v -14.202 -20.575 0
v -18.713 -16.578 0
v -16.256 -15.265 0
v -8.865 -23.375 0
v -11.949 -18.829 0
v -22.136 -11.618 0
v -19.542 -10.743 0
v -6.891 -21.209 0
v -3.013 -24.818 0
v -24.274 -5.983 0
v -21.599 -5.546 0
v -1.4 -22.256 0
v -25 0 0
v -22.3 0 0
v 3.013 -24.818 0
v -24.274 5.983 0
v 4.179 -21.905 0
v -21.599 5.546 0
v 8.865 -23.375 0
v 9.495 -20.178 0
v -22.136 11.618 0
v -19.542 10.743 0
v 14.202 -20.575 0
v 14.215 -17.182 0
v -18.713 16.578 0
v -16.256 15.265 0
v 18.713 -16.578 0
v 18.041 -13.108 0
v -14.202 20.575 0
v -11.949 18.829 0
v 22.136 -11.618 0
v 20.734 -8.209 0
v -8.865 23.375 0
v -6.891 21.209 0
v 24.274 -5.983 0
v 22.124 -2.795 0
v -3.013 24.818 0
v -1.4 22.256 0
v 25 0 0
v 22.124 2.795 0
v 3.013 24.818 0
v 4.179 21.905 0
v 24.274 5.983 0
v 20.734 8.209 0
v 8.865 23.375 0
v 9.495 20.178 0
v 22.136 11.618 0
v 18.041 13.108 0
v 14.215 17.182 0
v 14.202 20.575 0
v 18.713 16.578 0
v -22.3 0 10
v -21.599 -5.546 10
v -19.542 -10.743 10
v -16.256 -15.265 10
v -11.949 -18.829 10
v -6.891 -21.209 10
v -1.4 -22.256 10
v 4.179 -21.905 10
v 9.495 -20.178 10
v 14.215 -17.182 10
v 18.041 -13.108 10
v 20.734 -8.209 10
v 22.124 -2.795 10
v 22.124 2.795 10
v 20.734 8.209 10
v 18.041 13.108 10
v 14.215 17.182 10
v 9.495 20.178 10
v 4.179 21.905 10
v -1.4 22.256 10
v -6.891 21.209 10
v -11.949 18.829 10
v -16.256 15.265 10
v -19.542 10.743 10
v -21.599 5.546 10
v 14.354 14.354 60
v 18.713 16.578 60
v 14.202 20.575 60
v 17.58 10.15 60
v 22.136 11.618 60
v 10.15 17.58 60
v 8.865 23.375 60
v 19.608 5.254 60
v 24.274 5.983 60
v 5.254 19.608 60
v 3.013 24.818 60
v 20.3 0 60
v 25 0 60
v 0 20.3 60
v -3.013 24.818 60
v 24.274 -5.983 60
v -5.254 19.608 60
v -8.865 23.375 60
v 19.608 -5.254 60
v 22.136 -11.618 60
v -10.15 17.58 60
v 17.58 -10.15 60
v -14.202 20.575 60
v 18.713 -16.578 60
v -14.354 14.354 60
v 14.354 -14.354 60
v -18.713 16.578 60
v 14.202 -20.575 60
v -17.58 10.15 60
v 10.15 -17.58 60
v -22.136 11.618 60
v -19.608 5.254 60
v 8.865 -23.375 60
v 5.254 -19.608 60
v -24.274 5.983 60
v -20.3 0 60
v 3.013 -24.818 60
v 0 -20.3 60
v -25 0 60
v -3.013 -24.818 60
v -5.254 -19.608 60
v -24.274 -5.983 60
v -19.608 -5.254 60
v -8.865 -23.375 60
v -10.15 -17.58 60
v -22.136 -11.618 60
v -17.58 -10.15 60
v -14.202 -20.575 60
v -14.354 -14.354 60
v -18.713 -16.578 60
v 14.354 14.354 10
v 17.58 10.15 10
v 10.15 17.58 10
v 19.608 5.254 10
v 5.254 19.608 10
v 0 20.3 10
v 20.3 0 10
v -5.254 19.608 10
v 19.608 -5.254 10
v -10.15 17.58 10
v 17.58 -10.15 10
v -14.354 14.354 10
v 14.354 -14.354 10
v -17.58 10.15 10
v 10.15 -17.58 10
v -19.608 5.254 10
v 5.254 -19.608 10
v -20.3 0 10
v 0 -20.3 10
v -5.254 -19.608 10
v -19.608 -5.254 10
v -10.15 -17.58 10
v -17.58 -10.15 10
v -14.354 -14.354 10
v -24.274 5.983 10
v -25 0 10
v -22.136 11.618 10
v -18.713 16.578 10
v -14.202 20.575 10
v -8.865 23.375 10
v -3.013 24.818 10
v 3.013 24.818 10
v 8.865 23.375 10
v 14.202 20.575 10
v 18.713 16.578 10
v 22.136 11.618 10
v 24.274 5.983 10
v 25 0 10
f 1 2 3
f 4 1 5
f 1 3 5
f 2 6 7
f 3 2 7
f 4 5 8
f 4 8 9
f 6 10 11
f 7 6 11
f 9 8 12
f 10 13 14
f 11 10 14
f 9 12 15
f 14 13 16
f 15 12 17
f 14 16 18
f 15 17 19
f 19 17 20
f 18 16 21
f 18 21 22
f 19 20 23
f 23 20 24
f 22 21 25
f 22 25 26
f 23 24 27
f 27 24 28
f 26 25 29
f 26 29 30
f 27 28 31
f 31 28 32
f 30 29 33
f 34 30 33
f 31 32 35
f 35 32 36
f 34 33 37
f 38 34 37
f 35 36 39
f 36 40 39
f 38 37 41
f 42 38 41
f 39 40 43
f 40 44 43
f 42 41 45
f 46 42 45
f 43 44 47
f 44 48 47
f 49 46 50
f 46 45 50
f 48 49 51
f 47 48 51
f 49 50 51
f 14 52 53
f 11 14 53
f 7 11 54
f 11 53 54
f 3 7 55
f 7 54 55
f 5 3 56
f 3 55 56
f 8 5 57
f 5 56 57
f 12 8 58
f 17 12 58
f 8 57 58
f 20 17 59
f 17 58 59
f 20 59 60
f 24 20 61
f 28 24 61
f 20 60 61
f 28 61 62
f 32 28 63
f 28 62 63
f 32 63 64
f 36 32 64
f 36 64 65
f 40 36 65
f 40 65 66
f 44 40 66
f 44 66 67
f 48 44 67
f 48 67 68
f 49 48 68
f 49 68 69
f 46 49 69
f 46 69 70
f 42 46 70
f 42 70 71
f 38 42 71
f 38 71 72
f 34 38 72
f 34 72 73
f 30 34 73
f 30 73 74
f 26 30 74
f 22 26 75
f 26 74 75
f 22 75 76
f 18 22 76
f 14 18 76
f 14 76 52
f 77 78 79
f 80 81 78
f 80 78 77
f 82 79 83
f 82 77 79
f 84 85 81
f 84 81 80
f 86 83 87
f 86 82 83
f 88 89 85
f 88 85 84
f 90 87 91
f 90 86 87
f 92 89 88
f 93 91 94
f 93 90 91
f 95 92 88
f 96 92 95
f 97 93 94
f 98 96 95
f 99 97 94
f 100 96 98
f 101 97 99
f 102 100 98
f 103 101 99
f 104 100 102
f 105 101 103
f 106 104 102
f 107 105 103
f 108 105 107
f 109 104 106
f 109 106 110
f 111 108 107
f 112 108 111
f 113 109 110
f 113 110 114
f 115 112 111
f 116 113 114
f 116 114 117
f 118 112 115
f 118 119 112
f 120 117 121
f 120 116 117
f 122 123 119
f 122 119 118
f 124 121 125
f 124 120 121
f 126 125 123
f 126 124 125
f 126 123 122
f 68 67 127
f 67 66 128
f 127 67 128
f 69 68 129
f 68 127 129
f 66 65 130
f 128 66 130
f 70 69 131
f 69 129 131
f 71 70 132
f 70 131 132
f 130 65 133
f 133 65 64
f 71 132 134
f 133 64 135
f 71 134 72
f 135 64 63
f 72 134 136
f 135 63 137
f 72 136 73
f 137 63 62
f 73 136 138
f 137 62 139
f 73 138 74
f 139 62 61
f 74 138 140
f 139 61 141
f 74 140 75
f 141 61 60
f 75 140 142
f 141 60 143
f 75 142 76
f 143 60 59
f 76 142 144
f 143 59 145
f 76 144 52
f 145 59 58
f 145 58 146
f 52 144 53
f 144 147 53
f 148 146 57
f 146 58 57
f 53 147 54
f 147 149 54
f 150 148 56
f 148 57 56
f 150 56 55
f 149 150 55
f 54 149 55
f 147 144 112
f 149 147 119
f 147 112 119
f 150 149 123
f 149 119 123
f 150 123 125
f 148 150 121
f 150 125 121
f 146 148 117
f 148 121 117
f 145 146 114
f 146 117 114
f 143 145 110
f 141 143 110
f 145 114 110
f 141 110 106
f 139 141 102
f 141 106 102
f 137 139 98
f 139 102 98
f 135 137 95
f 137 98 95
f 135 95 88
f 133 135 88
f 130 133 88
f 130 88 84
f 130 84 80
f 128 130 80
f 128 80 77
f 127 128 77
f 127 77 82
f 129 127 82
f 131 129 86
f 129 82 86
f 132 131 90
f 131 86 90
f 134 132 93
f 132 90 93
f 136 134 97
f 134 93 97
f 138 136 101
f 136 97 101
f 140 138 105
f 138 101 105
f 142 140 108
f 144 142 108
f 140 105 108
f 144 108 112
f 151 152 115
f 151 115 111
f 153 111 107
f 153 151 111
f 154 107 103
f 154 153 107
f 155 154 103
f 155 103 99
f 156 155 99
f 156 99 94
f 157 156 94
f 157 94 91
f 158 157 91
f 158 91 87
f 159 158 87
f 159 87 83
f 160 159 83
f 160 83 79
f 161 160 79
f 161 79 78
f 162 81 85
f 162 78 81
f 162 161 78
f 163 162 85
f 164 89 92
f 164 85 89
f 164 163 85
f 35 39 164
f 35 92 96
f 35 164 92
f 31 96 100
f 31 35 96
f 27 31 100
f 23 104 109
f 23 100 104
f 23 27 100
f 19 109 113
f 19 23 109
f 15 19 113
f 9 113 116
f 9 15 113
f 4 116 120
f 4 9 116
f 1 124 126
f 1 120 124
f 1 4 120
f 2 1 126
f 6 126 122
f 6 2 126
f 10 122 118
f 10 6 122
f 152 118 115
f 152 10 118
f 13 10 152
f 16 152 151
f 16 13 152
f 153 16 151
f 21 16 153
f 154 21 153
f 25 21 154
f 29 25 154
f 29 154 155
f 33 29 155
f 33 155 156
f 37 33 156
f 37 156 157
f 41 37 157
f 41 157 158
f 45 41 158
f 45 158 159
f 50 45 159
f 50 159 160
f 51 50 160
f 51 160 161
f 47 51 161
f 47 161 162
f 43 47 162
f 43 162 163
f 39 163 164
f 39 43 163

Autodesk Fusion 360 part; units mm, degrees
sketch "Sketch1" plane through (0, 0, 0) normal (0, 0, 1) x (1, 0, 0)
  circle A0 centre (0, 0) radius 25
  dimension "d5" = 50
extrude "Extrude1" add sketch "Sketch1" along normal blind 10
sketch "Sketch2" plane through (0, 0, 10) normal (0, 0, 1) x (-1, 0, 0)
  circle A0 centre (0, 0) radius 25
  circle A1 centre (0, 0) radius 22.3
  dimension "d8" = 44.6
extrude "Extrude2" cut sketch "Sketch2" against normal blind 10 contours A1
sketch "Sketch3" plane through (0, 0, 10) normal (0, 0, 1) x (-1, 0, 0)
  circle A0 centre (0, 0) radius 22.3
  circle A1 centre (0, 0) radius 25
  circle A2 centre (0, 0) radius 25
extrude "Extrude3" add sketch "Sketch3" along normal blind 50 contours A0 | A1 A2
sketch "Sketch4" plane through (0, 0, 60) normal (0, 0, 1) x (-1, 0, 0)
  circle A0 centre (0, 0) radius 25
  circle A1 centre (0, 0) radius 20.3
  dimension "d13" = 40.6
extrude "Extrude4" cut sketch "Sketch4" against normal blind 50 contours A1
sketch "Sketch5" plane through (0, 0, 60) normal (0, 0, 1) x (-1, 0, 0)
  circle A0 centre (0, 0) radius 20.3
  circle A1 centre (0, 0) radius 25
  circle A2 centre (0, 0) radius 23.3
  dimension "d16" = 46.6
equation "LowerInnerDiam = 44 mm"
equation "Thickness = 3 mm"
equation "UpperInner = 40 mm"
equation "Tol = 0.6 mm"
equation "d5 = LowerInnerDiam + 2 * Thickness"
equation "d8 = LowerInnerDiam + Tol"
equation "d13 = 40 mm + Tol"
equation "d16 = UpperInner + Tol + 2 * Thickness"
